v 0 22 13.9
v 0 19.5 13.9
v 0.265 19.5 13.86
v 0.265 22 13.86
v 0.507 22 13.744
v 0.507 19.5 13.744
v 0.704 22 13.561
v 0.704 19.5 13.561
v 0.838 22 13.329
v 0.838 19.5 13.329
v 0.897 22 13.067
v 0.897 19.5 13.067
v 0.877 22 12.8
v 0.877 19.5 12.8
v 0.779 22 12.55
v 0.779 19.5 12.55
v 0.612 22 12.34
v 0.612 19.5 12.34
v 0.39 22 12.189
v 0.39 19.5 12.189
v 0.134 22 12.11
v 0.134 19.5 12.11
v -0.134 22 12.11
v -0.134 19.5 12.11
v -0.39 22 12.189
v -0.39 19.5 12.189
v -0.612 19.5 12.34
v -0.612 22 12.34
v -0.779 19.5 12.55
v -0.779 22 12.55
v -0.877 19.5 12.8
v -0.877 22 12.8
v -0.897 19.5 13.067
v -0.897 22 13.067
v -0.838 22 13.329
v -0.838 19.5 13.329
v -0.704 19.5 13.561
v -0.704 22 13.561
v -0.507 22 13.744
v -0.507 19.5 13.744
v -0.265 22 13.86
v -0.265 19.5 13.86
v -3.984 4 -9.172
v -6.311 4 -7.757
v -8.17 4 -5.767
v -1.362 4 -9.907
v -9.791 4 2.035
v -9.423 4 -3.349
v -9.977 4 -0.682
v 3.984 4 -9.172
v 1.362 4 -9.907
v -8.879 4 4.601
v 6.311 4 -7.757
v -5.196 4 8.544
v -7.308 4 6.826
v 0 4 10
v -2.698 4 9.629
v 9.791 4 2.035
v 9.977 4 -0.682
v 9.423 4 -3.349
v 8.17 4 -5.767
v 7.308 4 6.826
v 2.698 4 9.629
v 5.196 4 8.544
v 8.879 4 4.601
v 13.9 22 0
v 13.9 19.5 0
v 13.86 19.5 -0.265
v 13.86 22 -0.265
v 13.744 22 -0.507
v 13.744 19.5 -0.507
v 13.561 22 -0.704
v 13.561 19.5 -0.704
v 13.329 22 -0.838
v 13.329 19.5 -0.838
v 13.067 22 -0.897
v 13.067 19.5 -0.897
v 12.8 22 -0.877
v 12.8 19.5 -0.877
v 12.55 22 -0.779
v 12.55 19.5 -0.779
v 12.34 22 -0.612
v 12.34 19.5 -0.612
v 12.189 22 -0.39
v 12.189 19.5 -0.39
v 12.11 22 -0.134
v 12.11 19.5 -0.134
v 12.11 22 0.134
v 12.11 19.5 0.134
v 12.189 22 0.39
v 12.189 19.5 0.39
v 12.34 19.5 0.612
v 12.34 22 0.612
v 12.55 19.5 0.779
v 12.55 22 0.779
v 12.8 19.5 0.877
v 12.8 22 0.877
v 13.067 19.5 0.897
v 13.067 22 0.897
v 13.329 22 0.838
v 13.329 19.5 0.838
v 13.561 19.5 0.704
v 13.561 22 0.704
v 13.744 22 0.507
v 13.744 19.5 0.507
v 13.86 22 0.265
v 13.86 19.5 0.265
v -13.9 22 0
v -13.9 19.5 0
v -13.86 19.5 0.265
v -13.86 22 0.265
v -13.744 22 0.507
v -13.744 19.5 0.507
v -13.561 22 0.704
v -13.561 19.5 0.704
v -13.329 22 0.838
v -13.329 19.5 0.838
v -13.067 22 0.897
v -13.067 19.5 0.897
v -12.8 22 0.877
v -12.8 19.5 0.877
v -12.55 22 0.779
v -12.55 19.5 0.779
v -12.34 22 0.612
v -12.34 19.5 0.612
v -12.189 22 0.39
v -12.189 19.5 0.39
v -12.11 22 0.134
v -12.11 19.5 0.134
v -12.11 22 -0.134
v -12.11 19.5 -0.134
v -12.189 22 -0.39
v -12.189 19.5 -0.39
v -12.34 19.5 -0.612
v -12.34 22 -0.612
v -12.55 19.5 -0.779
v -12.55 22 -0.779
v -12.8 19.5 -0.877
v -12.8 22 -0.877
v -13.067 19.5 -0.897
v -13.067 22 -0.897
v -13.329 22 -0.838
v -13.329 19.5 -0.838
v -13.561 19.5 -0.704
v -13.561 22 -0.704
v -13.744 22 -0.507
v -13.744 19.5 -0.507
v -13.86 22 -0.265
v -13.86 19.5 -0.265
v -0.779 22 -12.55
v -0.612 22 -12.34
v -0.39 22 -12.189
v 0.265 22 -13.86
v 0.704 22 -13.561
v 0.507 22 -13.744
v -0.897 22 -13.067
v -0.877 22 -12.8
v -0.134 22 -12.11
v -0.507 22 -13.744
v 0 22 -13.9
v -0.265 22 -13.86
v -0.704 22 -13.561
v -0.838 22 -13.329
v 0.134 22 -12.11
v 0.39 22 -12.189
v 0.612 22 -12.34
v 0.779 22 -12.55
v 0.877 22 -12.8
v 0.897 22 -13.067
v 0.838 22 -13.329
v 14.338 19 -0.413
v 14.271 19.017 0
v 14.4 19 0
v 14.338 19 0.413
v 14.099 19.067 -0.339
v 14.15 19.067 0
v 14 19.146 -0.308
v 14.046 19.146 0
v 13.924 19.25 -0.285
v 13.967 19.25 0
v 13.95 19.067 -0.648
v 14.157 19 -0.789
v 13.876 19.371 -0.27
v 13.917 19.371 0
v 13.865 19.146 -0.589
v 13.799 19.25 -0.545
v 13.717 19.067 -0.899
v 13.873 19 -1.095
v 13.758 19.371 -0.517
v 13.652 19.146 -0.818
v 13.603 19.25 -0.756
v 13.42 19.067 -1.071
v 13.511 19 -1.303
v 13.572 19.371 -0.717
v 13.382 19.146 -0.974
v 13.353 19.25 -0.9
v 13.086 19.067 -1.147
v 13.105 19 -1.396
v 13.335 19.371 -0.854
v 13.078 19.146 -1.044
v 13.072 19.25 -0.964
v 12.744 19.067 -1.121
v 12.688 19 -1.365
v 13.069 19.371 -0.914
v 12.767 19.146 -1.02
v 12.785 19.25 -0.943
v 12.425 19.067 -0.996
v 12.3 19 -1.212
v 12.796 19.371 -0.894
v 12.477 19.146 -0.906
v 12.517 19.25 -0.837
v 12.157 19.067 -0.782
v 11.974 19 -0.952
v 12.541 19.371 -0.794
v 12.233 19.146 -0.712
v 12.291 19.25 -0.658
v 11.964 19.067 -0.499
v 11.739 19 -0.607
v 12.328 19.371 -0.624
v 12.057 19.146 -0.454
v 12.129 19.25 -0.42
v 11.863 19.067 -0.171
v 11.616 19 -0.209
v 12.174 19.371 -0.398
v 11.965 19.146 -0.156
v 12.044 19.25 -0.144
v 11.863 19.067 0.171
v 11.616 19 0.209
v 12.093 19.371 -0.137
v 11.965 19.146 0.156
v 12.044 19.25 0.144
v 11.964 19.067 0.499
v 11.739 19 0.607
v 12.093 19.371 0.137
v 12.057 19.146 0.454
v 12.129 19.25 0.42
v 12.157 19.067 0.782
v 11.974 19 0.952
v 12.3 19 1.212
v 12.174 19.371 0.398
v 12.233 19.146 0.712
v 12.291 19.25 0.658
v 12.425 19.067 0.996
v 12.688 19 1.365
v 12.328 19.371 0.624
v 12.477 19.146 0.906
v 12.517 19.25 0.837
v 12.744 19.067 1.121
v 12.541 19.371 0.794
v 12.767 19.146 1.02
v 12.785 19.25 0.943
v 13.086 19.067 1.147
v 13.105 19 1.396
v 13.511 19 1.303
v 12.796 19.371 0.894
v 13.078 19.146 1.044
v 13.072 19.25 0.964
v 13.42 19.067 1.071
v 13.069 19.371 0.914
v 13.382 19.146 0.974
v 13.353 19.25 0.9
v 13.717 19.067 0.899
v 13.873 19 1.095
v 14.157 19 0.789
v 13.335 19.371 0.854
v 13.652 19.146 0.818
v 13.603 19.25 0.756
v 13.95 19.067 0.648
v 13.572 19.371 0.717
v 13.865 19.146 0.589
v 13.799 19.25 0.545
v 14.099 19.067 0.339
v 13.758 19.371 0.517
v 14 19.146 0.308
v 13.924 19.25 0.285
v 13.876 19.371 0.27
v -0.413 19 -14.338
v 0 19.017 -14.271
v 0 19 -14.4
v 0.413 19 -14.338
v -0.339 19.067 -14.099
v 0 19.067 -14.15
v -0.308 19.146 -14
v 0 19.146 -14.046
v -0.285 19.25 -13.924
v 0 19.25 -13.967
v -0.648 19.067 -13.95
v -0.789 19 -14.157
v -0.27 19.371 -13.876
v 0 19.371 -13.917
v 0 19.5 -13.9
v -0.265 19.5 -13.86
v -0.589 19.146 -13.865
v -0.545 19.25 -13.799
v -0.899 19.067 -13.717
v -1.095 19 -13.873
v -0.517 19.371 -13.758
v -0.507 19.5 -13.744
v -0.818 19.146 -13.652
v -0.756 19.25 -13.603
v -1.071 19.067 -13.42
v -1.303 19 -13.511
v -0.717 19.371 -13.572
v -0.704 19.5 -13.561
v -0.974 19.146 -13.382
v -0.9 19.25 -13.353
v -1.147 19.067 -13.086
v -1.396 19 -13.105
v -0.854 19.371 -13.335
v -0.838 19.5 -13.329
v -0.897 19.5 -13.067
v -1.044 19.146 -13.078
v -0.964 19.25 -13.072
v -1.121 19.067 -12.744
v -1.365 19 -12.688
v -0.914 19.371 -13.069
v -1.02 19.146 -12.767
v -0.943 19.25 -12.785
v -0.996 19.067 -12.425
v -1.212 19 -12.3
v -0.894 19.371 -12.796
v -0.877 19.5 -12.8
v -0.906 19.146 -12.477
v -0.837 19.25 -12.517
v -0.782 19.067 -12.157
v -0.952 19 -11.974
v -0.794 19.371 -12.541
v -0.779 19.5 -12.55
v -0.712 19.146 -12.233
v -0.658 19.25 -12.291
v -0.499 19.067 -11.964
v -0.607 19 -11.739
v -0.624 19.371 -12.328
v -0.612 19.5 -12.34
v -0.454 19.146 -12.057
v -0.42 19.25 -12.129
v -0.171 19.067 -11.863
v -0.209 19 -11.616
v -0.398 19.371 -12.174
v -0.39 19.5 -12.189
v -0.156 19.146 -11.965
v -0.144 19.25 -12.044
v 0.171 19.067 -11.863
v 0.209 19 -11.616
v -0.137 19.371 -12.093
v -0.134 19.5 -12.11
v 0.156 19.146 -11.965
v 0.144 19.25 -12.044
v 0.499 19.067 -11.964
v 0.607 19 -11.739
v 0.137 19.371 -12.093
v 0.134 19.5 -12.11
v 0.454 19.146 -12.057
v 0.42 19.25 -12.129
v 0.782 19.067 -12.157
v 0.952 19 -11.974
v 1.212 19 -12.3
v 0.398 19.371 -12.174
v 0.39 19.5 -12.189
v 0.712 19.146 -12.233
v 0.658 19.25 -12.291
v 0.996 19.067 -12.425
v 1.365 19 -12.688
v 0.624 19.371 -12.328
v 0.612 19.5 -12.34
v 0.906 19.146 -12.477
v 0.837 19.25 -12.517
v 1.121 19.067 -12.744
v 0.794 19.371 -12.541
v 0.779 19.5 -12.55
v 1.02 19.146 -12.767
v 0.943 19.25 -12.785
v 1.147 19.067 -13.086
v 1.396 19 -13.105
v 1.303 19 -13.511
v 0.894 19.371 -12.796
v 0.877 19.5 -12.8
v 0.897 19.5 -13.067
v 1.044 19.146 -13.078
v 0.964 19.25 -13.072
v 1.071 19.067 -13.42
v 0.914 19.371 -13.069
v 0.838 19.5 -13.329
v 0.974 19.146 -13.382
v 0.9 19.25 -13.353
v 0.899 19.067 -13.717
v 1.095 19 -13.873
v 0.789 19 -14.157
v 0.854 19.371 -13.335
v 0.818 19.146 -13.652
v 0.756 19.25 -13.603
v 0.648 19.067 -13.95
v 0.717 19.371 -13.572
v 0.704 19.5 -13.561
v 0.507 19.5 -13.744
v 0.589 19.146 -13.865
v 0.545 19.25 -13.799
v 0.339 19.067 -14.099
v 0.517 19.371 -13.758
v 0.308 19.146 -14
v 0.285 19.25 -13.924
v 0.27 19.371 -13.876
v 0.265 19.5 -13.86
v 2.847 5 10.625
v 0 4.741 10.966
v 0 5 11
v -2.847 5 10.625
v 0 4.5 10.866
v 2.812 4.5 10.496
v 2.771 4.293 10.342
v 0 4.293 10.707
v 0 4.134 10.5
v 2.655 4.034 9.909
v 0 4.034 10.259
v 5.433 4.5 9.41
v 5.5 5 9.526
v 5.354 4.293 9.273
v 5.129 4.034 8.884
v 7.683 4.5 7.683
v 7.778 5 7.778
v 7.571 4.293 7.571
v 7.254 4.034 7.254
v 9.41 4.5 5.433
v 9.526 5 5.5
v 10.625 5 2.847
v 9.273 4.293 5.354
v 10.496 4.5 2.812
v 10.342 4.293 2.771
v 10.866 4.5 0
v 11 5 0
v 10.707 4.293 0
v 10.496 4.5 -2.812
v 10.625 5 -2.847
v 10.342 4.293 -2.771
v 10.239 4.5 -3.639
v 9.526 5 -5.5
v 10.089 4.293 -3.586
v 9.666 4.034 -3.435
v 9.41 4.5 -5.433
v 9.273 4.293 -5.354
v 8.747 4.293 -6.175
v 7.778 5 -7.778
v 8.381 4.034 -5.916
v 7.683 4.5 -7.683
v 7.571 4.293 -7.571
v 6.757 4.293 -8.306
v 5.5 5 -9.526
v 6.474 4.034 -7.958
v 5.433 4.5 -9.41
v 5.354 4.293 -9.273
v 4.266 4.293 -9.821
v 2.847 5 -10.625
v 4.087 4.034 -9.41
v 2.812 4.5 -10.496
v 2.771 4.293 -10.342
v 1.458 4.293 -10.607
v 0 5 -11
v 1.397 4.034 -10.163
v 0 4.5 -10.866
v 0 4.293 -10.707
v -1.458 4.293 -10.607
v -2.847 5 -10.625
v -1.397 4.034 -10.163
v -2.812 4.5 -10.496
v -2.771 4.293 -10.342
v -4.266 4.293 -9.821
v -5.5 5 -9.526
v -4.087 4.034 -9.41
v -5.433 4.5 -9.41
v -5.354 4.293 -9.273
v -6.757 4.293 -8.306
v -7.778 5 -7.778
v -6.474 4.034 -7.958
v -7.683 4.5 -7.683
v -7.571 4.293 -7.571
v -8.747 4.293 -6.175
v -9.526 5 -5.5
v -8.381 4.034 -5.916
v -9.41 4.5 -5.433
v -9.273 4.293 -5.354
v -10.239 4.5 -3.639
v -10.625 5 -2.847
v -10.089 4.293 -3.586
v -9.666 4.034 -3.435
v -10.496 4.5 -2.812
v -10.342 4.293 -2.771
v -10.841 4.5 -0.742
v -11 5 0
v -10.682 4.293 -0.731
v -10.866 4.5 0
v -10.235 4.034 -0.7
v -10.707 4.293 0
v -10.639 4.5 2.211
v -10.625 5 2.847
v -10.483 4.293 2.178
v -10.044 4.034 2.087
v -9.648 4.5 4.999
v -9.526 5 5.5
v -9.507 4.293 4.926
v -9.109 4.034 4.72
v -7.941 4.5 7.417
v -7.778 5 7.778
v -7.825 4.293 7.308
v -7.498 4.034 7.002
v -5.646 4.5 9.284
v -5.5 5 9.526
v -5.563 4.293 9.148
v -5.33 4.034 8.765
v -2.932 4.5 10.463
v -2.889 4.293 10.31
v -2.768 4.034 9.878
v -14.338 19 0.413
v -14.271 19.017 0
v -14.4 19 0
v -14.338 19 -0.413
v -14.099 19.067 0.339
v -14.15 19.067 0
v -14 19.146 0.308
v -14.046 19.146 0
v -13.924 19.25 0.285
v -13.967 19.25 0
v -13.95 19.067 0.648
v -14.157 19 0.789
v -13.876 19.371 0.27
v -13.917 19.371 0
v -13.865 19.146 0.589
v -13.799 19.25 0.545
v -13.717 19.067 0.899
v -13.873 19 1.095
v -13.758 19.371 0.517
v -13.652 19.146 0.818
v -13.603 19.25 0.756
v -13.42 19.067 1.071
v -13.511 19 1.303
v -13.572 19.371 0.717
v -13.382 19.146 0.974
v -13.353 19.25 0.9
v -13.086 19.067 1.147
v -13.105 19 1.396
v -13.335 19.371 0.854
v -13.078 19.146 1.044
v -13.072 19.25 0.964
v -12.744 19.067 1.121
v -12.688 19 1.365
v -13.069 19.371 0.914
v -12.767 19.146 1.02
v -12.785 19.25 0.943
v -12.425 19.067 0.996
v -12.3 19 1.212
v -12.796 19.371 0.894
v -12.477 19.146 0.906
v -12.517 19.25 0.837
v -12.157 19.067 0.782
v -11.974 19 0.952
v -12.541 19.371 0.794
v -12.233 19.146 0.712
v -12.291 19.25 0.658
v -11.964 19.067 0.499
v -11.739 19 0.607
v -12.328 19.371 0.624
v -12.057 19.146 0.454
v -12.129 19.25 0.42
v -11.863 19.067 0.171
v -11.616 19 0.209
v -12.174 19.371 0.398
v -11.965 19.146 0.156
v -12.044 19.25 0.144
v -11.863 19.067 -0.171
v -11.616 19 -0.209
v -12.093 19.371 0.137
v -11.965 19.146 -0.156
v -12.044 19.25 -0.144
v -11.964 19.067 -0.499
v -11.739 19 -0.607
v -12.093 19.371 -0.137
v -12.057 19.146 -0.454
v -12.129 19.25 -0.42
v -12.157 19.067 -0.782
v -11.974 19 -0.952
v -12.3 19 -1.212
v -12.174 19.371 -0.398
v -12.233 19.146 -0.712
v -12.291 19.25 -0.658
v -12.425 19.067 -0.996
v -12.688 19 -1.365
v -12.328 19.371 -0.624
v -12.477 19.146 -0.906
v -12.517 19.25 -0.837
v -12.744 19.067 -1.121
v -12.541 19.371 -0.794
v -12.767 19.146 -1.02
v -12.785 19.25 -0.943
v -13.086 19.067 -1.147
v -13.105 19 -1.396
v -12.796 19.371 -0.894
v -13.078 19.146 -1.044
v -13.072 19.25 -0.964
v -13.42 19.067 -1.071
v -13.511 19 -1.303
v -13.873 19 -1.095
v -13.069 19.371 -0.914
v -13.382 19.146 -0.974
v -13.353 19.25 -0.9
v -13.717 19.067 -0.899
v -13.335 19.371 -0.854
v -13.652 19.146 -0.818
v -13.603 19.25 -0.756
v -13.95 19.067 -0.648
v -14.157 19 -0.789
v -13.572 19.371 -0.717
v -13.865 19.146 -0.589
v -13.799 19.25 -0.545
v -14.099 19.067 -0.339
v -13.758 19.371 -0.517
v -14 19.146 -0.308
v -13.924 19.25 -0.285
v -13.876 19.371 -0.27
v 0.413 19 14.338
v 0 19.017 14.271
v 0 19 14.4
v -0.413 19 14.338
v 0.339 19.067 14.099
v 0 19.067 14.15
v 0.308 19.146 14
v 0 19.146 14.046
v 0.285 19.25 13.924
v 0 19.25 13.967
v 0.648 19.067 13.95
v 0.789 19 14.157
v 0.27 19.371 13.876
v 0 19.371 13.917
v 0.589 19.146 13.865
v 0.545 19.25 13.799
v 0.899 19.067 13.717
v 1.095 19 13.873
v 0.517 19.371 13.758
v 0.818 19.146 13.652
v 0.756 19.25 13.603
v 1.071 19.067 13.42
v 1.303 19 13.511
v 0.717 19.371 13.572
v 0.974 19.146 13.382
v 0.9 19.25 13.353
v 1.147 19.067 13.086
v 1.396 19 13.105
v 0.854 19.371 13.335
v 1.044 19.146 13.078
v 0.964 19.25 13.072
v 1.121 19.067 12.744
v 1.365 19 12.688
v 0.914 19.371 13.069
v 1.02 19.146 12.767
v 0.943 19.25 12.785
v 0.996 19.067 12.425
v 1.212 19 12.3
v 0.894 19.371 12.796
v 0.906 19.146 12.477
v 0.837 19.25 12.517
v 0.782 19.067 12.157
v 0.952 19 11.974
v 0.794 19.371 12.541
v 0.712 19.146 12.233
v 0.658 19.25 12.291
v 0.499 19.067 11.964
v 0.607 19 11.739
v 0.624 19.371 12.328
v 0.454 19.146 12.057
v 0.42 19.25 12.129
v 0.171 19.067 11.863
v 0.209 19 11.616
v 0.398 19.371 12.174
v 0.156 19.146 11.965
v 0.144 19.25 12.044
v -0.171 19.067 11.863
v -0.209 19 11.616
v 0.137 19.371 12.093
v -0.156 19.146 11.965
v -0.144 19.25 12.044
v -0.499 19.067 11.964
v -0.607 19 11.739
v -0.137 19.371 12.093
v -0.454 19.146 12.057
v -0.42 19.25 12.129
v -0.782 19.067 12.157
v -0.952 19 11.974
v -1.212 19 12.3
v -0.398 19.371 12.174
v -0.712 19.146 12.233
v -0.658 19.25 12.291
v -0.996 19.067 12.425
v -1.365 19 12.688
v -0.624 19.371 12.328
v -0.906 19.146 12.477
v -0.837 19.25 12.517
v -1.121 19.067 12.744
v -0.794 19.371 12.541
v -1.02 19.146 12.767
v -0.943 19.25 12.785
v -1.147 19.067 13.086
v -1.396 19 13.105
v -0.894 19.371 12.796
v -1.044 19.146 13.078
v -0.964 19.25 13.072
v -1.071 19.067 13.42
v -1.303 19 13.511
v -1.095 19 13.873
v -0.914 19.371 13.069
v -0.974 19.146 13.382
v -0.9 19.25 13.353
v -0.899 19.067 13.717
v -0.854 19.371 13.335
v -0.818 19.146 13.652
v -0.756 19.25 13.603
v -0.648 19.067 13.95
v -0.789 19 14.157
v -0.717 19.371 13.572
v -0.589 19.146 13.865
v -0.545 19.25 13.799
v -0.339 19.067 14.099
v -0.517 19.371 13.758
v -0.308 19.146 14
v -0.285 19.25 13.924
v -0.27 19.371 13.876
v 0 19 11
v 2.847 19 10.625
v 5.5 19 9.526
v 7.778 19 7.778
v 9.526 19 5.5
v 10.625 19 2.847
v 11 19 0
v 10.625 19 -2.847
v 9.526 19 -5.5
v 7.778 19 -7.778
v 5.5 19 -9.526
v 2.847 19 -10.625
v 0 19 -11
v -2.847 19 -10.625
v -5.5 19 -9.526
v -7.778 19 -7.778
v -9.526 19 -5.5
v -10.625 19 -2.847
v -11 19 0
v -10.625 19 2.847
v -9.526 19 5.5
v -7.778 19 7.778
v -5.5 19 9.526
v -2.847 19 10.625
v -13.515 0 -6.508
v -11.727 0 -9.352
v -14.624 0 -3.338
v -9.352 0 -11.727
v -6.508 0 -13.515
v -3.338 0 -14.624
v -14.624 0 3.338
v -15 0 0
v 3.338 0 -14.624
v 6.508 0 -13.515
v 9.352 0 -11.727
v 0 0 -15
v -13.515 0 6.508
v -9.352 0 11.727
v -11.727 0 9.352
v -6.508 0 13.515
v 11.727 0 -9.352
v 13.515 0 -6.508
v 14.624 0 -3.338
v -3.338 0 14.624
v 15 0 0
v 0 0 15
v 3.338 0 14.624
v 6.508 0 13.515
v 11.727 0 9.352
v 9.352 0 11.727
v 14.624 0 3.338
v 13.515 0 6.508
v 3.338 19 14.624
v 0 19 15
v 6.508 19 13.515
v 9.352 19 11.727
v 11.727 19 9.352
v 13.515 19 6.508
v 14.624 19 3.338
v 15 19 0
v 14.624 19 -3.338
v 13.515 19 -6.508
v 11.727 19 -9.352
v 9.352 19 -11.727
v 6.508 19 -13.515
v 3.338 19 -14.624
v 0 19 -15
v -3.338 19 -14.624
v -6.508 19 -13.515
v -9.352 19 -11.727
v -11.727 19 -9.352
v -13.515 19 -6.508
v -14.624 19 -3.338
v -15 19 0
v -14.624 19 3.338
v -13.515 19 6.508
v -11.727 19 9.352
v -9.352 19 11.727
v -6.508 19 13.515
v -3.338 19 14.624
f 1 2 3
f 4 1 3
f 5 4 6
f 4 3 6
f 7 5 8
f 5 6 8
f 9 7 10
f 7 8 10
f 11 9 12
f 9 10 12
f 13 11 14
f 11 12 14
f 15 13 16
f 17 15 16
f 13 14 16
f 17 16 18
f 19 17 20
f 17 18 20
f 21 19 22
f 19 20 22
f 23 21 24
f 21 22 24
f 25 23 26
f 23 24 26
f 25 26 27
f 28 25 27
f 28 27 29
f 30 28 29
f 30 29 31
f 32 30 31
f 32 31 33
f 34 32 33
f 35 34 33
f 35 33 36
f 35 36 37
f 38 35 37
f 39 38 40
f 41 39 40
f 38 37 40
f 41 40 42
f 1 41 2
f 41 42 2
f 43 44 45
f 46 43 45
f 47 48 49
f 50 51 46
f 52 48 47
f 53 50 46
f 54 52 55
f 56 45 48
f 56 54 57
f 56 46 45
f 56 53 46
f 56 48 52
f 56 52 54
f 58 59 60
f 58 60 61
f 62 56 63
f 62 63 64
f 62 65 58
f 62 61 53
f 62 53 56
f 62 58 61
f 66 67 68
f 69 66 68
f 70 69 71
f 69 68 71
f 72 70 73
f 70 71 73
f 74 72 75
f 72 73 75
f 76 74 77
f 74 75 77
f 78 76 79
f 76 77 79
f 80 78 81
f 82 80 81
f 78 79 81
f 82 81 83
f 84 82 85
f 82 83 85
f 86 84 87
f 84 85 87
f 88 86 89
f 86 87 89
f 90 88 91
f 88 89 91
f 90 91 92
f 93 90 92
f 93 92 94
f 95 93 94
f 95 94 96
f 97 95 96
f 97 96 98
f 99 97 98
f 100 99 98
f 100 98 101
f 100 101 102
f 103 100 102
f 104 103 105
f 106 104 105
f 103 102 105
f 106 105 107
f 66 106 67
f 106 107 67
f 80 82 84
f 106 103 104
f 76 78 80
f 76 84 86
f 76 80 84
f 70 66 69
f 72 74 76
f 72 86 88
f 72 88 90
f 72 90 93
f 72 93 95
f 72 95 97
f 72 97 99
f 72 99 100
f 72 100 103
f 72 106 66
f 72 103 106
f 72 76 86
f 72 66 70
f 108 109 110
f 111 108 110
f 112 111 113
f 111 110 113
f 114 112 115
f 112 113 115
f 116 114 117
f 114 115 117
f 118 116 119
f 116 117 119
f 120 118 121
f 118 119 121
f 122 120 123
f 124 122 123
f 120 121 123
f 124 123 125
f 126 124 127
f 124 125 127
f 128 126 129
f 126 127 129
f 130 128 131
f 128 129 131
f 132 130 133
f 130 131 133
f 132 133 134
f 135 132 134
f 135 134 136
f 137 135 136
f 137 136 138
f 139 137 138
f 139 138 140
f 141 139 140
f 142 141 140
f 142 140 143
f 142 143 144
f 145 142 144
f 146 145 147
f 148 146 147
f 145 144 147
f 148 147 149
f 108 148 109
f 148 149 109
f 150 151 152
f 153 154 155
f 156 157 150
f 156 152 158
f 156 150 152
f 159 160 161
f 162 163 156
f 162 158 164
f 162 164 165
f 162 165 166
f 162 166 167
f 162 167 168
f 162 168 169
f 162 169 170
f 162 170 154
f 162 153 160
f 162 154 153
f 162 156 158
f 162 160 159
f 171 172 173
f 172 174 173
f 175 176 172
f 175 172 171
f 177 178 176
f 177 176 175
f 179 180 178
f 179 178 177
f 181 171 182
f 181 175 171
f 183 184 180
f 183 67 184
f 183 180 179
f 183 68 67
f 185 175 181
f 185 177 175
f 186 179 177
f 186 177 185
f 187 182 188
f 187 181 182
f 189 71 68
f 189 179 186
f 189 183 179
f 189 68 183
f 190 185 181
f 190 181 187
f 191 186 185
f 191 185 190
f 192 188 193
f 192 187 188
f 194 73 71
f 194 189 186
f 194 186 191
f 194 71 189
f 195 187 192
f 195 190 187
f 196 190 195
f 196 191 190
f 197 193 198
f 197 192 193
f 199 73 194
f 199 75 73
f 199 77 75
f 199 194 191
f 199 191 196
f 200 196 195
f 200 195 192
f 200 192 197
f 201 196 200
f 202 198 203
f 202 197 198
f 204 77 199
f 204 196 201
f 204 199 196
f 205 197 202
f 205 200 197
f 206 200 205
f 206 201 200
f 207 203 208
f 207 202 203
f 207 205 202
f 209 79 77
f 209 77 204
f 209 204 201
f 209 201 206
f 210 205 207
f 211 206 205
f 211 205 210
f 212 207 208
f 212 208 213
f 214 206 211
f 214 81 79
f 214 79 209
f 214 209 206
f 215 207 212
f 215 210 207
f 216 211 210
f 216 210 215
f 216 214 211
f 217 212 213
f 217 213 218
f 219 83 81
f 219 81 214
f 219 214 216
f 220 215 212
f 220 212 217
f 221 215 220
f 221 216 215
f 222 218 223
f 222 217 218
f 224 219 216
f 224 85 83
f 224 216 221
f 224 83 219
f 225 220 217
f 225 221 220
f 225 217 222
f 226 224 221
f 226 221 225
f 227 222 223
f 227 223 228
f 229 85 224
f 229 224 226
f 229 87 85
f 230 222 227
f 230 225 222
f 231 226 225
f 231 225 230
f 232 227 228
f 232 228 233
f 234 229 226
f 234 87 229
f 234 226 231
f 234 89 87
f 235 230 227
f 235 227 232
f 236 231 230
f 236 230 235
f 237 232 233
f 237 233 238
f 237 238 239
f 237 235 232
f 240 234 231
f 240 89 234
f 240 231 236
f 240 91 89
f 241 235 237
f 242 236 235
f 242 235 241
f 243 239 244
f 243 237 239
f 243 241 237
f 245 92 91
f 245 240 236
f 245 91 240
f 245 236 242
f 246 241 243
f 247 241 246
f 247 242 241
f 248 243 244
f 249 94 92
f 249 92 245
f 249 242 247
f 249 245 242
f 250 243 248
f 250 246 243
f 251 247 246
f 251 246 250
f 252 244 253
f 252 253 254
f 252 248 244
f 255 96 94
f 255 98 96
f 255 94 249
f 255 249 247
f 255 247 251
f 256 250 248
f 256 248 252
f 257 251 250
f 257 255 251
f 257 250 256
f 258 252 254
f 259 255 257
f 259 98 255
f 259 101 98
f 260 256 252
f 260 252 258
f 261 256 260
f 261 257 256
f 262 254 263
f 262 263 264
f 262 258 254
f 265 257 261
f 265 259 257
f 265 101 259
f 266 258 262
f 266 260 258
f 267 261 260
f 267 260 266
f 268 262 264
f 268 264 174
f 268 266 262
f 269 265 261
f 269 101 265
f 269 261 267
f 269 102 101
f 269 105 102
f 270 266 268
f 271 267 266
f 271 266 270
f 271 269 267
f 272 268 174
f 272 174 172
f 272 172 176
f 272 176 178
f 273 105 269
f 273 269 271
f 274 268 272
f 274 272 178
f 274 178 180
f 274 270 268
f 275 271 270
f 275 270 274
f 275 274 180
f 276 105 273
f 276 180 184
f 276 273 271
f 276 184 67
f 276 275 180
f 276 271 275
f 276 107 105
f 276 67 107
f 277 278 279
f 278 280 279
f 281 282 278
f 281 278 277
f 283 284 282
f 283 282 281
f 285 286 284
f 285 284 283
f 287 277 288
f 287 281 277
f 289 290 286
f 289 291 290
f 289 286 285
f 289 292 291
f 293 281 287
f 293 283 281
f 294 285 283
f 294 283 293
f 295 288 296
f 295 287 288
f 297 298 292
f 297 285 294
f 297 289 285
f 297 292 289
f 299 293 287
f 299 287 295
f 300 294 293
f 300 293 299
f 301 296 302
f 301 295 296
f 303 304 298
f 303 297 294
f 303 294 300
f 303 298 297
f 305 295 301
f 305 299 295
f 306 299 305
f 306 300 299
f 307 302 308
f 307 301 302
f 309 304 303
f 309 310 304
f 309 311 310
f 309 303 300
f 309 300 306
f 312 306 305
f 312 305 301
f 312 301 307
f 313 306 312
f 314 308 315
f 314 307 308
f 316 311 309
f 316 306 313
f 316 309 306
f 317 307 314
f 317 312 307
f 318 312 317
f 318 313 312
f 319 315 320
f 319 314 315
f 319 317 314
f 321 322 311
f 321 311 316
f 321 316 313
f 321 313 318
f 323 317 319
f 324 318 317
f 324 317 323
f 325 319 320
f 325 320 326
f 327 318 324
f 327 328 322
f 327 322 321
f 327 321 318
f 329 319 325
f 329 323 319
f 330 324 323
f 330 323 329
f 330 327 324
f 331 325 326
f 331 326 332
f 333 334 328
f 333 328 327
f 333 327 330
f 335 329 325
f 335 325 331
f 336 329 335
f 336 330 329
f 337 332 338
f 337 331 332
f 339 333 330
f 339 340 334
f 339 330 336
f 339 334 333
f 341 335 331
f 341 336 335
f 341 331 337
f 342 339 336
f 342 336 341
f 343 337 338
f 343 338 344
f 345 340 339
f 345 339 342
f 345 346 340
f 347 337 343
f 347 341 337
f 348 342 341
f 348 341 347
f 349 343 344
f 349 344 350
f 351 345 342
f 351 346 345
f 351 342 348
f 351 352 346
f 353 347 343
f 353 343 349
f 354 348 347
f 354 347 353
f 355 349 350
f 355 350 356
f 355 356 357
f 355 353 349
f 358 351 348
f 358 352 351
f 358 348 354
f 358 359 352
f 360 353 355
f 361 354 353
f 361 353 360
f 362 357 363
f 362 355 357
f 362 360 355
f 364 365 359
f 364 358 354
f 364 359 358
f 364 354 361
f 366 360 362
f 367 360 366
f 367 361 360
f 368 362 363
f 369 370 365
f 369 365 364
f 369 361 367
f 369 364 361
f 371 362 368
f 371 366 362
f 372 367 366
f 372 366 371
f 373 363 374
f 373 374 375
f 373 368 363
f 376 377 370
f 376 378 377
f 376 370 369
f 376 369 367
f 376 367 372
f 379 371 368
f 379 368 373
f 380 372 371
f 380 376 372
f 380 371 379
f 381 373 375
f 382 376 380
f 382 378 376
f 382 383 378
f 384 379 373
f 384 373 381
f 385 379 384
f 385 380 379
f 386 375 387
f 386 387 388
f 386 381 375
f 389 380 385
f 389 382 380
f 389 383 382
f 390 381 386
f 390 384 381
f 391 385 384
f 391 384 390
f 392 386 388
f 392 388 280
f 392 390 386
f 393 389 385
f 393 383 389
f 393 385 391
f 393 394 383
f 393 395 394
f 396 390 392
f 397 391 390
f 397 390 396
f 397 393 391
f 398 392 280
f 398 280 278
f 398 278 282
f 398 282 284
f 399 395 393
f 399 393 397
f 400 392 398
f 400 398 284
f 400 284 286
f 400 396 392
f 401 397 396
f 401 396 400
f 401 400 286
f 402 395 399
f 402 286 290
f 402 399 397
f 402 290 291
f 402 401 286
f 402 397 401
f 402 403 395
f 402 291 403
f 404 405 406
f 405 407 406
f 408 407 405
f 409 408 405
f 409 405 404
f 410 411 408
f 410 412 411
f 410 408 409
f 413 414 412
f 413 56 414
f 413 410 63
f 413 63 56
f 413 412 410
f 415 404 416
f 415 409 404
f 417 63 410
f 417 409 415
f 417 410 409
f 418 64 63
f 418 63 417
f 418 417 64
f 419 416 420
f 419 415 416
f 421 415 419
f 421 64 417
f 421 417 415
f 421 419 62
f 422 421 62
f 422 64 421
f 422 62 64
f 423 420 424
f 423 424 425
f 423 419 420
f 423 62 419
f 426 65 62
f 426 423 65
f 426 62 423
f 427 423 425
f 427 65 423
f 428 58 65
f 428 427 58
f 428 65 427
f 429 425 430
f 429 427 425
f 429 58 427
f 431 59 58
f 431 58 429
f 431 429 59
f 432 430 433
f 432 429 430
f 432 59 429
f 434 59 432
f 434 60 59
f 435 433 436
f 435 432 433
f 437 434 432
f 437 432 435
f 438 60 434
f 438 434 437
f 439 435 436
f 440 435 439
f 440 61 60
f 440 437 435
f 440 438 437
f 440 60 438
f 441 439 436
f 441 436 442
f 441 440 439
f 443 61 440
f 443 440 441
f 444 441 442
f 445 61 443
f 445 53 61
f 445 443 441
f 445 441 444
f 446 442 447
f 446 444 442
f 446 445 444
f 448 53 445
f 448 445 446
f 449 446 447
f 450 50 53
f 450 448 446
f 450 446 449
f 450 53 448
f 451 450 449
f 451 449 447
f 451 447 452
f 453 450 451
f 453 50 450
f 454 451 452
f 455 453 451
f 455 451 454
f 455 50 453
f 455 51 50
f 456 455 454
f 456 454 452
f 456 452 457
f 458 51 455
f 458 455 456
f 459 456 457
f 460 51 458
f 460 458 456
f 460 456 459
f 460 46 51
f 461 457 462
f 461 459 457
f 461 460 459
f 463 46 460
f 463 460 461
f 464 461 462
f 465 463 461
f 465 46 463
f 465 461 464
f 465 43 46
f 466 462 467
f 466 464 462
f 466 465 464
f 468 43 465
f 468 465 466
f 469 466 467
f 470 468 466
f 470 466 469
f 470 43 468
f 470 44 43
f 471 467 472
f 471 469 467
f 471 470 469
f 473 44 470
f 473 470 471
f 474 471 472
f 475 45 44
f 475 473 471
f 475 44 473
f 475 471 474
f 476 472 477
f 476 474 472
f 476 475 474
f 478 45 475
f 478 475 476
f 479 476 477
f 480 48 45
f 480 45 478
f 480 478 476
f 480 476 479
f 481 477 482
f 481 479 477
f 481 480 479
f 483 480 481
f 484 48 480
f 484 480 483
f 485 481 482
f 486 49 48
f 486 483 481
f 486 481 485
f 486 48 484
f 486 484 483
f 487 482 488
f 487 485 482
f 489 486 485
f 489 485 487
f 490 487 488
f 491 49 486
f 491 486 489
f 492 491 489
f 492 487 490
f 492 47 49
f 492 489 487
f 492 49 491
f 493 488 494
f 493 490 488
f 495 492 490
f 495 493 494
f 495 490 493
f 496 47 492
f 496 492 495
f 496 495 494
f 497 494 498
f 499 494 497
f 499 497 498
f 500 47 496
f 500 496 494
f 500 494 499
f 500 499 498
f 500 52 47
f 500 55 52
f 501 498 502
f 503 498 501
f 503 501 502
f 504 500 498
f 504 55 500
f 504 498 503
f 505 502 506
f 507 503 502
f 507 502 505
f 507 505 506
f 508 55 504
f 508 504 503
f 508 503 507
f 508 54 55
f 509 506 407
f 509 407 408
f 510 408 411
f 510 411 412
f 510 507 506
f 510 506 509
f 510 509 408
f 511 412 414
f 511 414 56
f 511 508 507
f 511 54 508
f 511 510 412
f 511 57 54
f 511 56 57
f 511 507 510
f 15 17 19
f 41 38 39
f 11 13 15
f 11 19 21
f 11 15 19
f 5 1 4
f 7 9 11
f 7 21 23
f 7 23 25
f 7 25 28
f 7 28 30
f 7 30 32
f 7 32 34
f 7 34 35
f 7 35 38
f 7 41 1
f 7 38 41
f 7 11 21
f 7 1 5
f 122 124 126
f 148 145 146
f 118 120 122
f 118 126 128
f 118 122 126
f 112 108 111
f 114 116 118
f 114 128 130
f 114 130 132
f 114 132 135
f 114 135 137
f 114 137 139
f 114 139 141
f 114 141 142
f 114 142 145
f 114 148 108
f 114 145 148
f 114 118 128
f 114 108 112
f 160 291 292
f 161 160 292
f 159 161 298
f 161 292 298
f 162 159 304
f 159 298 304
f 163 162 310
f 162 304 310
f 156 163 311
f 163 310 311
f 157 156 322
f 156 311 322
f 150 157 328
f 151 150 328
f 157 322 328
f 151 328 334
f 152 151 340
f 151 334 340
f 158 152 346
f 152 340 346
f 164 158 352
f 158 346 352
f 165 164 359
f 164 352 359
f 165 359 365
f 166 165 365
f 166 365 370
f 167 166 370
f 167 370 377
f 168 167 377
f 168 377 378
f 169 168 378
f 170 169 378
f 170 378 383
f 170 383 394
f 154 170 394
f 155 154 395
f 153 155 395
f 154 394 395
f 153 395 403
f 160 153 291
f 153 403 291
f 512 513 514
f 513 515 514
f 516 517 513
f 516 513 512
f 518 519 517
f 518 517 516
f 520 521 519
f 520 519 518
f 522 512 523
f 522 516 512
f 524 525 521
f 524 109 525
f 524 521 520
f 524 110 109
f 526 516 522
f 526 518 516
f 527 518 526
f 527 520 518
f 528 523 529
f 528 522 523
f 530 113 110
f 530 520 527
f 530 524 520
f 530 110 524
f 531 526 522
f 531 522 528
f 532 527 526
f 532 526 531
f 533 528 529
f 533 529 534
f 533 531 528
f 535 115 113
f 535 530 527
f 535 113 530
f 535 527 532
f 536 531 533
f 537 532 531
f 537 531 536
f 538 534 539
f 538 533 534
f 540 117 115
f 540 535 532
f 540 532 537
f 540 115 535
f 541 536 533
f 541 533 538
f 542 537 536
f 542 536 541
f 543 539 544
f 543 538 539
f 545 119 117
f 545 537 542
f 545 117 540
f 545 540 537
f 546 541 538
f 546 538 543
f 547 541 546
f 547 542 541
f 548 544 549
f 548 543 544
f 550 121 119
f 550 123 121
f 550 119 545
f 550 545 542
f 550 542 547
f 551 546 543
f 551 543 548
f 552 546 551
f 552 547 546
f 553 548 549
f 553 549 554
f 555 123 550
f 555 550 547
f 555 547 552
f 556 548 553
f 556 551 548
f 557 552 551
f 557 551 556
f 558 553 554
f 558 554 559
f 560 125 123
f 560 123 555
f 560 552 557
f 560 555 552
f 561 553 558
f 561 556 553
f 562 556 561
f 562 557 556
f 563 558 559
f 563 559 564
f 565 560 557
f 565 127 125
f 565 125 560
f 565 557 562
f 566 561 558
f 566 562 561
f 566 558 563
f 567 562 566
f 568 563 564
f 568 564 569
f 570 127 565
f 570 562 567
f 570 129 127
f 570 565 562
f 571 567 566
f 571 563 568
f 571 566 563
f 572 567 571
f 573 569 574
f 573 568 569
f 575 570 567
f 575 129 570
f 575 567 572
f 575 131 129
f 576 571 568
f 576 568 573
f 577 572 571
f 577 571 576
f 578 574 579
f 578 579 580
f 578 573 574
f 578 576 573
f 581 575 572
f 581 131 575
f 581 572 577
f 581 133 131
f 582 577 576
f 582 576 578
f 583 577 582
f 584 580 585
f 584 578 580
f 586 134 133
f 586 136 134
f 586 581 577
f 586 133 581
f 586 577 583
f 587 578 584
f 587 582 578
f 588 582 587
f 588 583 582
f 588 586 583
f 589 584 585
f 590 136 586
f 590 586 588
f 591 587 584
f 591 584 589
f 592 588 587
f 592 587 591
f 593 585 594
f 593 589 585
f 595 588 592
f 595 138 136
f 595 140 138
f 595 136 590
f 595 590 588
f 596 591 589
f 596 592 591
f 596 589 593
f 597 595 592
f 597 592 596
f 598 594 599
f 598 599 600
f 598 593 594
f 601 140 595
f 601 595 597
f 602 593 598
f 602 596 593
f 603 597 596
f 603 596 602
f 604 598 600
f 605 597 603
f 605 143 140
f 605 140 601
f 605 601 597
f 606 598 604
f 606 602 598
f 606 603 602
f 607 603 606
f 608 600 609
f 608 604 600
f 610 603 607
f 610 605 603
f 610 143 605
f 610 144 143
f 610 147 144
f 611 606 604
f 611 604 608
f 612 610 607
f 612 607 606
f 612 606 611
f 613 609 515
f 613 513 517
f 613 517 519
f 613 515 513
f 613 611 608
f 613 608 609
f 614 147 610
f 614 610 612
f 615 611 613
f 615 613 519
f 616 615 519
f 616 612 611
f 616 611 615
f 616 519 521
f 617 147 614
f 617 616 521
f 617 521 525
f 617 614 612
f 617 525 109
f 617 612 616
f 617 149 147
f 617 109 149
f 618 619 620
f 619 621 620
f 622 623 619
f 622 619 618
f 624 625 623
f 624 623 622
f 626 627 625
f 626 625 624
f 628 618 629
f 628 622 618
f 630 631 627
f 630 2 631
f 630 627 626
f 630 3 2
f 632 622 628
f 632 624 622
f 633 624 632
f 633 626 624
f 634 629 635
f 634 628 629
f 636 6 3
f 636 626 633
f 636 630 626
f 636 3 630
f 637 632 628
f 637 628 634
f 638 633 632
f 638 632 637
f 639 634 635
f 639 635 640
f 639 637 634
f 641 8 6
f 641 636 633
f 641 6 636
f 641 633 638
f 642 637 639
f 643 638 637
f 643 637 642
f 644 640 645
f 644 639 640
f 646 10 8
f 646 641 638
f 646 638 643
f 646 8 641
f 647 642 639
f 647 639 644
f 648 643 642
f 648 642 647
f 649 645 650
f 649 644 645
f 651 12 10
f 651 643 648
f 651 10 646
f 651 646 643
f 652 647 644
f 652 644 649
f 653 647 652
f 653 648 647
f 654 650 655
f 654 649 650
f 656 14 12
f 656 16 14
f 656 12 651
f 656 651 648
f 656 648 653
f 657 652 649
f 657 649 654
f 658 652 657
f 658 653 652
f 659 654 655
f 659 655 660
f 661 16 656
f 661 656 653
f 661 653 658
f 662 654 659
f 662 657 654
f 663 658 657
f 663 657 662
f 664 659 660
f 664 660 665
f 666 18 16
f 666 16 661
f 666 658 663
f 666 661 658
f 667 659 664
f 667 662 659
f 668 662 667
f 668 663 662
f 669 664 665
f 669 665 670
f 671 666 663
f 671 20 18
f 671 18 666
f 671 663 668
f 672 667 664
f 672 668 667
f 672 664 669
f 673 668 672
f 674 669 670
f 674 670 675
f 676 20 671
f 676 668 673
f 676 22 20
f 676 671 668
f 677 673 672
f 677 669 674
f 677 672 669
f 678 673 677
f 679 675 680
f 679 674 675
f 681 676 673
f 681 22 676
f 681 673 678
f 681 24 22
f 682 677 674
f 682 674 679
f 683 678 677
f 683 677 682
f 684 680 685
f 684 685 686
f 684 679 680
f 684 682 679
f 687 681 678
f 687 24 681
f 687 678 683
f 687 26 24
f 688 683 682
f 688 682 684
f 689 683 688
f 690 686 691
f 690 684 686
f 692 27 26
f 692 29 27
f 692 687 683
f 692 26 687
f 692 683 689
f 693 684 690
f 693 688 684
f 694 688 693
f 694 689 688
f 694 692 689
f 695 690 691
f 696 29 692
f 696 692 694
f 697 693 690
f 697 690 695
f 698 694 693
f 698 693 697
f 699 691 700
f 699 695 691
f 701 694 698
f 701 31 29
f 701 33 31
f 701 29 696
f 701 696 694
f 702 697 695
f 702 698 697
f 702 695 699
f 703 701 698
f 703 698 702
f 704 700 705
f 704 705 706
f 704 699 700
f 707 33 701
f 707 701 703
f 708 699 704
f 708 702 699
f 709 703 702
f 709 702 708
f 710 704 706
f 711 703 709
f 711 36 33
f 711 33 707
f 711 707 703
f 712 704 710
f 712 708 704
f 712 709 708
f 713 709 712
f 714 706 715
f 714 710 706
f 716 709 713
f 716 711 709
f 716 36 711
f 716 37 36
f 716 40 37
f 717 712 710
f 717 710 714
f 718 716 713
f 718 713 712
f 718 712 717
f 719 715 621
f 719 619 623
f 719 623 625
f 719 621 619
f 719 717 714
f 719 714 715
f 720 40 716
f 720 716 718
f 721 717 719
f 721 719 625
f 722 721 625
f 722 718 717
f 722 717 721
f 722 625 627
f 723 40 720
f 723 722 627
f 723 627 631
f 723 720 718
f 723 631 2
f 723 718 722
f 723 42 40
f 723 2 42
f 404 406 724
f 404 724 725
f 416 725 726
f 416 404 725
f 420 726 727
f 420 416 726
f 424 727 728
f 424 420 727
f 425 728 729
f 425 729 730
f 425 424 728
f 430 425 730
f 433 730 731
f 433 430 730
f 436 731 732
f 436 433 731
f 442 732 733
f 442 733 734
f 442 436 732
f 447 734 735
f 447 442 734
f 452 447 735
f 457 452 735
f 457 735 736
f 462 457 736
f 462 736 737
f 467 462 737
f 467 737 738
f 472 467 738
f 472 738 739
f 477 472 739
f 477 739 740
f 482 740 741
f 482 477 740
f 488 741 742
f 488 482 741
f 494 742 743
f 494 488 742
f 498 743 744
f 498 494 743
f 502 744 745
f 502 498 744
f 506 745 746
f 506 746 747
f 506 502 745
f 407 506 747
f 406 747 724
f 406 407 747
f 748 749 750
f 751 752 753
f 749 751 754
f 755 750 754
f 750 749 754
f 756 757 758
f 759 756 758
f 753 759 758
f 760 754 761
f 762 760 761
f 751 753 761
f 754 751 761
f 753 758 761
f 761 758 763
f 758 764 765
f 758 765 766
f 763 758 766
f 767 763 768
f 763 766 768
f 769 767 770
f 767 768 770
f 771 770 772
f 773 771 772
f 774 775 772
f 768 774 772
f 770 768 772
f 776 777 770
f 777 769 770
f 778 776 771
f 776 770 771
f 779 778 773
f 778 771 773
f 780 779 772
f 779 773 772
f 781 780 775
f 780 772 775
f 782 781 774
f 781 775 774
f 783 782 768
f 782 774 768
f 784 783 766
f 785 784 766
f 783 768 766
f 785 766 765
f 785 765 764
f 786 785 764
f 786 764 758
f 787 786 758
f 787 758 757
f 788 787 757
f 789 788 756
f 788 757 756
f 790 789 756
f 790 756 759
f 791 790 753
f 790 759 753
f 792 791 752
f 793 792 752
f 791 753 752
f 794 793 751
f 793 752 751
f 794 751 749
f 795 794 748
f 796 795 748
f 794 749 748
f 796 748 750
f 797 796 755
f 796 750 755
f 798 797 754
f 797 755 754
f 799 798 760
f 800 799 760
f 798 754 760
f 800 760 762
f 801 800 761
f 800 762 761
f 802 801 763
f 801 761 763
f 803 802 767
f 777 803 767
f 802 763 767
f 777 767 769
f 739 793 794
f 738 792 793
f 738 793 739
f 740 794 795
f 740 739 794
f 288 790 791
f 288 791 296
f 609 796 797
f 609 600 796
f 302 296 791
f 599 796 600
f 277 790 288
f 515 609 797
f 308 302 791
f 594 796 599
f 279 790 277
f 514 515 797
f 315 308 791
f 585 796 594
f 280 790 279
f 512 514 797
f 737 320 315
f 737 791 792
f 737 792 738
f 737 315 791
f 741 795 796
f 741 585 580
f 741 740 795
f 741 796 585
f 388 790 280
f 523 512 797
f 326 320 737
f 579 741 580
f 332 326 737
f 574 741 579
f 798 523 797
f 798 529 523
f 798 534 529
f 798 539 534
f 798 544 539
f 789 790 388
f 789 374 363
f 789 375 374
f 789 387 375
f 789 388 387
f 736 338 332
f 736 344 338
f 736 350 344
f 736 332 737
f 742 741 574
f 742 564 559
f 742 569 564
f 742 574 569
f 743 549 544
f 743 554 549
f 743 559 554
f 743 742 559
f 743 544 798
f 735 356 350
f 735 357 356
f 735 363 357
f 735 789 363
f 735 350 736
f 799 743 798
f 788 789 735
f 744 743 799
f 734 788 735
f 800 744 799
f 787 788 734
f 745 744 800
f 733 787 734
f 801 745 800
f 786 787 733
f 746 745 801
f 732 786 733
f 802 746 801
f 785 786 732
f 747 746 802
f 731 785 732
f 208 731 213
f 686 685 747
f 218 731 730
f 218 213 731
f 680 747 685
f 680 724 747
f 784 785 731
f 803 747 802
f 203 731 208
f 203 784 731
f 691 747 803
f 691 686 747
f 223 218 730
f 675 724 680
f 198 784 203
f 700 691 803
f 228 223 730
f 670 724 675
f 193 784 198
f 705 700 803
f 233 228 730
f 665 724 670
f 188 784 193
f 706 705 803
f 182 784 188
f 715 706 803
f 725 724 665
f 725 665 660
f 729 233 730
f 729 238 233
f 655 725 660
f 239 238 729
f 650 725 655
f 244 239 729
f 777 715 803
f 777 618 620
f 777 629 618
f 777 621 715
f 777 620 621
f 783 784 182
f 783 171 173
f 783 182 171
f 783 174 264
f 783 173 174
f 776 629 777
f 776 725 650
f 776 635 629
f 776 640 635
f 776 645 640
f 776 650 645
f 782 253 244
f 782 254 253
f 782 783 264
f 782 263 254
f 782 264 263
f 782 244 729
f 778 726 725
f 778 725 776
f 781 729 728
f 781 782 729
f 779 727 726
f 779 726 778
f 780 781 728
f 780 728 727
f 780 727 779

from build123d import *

# Parameters (mm, degrees)
SKETCH1_R                = 15
BOSS_EXTRUDE1_DEPTH      = 4
SKETCH2_R                = 15
SKETCH2_R_2              = 11
BOSS_EXTRUDE2_DEPTH      = 15
SKETCH3_R                = 0.9
BOSS_EXTRUDE3_DEPTH      = 3
FILLET1_R                = 0.5
CIRPATTERN1_COUNT        = 4
FILLET1_OF_CIRPATTERN1_R = 0.5
FILLET2_R                = 1


with BuildPart() as part:
    # Sketch1 → Boss-Extrude1 (new body)
    with BuildSketch(Plane(origin=(0, 0, 0), x_dir=(1, 0, 0), z_dir=(0, 1, 0))):
        with Locations(Location((0, 0, 0), (0, 0, 270))):
            Circle(SKETCH1_R)
    extrude(amount=BOSS_EXTRUDE1_DEPTH)

    # Sketch2 → Boss-Extrude2 (add)
    with BuildSketch(Plane(origin=(0, 4, 0), x_dir=(1, 0, 0), z_dir=(0, 1, 0))):
        with Locations(Location((0, 0, 0), (0, 0, 270))):
            Circle(SKETCH2_R)
        with Locations(Location((0, 0, 0), (0, 0, 270))):
            Circle(SKETCH2_R_2, mode=Mode.SUBTRACT)
    extrude(amount=BOSS_EXTRUDE2_DEPTH)

    # Sketch3 → Boss-Extrude3 (add)
    with BuildSketch(Plane(origin=(0, 19, 0), x_dir=(1, 0, 0), z_dir=(0, 1, 0))):
        with Locations(Location((0, -13, 0), (0, 0, 270))):
            Circle(SKETCH3_R)
    boss_extrude3 = extrude(amount=BOSS_EXTRUDE3_DEPTH)

    # Fillet1
    fillet1_edges = [part.edges().sort_by_distance(p)[0] for p in [
        (0, 19, 12.1),
    ]]
    fillet(fillet1_edges, radius=FILLET1_R)

    # CirPattern1: Boss-Extrude3 ×4 about axis
    cirpattern1_axis = Axis((0, 0, 0), (0, 1, 0))
    for i in range(1, CIRPATTERN1_COUNT):
        add(boss_extrude3.rotate(cirpattern1_axis, i * 360 / CIRPATTERN1_COUNT))

    # Fillet1 of CirPattern1
    fillet1_of_cirpattern1_edges = [part.edges().sort_by_distance(p)[0] for p in [
        (12.1, 19, 0),
        (0, 19, -12.1),
        (-12.1, 19, 0),
    ]]
    fillet(fillet1_of_cirpattern1_edges, radius=FILLET1_OF_CIRPATTERN1_R)

    # Fillet2
    fillet2_edges = [part.edges().sort_by_distance(p)[0] for p in [
        (0, 4, -11),
    ]]
    fillet(fillet2_edges, radius=FILLET2_R)


solid = part.part
